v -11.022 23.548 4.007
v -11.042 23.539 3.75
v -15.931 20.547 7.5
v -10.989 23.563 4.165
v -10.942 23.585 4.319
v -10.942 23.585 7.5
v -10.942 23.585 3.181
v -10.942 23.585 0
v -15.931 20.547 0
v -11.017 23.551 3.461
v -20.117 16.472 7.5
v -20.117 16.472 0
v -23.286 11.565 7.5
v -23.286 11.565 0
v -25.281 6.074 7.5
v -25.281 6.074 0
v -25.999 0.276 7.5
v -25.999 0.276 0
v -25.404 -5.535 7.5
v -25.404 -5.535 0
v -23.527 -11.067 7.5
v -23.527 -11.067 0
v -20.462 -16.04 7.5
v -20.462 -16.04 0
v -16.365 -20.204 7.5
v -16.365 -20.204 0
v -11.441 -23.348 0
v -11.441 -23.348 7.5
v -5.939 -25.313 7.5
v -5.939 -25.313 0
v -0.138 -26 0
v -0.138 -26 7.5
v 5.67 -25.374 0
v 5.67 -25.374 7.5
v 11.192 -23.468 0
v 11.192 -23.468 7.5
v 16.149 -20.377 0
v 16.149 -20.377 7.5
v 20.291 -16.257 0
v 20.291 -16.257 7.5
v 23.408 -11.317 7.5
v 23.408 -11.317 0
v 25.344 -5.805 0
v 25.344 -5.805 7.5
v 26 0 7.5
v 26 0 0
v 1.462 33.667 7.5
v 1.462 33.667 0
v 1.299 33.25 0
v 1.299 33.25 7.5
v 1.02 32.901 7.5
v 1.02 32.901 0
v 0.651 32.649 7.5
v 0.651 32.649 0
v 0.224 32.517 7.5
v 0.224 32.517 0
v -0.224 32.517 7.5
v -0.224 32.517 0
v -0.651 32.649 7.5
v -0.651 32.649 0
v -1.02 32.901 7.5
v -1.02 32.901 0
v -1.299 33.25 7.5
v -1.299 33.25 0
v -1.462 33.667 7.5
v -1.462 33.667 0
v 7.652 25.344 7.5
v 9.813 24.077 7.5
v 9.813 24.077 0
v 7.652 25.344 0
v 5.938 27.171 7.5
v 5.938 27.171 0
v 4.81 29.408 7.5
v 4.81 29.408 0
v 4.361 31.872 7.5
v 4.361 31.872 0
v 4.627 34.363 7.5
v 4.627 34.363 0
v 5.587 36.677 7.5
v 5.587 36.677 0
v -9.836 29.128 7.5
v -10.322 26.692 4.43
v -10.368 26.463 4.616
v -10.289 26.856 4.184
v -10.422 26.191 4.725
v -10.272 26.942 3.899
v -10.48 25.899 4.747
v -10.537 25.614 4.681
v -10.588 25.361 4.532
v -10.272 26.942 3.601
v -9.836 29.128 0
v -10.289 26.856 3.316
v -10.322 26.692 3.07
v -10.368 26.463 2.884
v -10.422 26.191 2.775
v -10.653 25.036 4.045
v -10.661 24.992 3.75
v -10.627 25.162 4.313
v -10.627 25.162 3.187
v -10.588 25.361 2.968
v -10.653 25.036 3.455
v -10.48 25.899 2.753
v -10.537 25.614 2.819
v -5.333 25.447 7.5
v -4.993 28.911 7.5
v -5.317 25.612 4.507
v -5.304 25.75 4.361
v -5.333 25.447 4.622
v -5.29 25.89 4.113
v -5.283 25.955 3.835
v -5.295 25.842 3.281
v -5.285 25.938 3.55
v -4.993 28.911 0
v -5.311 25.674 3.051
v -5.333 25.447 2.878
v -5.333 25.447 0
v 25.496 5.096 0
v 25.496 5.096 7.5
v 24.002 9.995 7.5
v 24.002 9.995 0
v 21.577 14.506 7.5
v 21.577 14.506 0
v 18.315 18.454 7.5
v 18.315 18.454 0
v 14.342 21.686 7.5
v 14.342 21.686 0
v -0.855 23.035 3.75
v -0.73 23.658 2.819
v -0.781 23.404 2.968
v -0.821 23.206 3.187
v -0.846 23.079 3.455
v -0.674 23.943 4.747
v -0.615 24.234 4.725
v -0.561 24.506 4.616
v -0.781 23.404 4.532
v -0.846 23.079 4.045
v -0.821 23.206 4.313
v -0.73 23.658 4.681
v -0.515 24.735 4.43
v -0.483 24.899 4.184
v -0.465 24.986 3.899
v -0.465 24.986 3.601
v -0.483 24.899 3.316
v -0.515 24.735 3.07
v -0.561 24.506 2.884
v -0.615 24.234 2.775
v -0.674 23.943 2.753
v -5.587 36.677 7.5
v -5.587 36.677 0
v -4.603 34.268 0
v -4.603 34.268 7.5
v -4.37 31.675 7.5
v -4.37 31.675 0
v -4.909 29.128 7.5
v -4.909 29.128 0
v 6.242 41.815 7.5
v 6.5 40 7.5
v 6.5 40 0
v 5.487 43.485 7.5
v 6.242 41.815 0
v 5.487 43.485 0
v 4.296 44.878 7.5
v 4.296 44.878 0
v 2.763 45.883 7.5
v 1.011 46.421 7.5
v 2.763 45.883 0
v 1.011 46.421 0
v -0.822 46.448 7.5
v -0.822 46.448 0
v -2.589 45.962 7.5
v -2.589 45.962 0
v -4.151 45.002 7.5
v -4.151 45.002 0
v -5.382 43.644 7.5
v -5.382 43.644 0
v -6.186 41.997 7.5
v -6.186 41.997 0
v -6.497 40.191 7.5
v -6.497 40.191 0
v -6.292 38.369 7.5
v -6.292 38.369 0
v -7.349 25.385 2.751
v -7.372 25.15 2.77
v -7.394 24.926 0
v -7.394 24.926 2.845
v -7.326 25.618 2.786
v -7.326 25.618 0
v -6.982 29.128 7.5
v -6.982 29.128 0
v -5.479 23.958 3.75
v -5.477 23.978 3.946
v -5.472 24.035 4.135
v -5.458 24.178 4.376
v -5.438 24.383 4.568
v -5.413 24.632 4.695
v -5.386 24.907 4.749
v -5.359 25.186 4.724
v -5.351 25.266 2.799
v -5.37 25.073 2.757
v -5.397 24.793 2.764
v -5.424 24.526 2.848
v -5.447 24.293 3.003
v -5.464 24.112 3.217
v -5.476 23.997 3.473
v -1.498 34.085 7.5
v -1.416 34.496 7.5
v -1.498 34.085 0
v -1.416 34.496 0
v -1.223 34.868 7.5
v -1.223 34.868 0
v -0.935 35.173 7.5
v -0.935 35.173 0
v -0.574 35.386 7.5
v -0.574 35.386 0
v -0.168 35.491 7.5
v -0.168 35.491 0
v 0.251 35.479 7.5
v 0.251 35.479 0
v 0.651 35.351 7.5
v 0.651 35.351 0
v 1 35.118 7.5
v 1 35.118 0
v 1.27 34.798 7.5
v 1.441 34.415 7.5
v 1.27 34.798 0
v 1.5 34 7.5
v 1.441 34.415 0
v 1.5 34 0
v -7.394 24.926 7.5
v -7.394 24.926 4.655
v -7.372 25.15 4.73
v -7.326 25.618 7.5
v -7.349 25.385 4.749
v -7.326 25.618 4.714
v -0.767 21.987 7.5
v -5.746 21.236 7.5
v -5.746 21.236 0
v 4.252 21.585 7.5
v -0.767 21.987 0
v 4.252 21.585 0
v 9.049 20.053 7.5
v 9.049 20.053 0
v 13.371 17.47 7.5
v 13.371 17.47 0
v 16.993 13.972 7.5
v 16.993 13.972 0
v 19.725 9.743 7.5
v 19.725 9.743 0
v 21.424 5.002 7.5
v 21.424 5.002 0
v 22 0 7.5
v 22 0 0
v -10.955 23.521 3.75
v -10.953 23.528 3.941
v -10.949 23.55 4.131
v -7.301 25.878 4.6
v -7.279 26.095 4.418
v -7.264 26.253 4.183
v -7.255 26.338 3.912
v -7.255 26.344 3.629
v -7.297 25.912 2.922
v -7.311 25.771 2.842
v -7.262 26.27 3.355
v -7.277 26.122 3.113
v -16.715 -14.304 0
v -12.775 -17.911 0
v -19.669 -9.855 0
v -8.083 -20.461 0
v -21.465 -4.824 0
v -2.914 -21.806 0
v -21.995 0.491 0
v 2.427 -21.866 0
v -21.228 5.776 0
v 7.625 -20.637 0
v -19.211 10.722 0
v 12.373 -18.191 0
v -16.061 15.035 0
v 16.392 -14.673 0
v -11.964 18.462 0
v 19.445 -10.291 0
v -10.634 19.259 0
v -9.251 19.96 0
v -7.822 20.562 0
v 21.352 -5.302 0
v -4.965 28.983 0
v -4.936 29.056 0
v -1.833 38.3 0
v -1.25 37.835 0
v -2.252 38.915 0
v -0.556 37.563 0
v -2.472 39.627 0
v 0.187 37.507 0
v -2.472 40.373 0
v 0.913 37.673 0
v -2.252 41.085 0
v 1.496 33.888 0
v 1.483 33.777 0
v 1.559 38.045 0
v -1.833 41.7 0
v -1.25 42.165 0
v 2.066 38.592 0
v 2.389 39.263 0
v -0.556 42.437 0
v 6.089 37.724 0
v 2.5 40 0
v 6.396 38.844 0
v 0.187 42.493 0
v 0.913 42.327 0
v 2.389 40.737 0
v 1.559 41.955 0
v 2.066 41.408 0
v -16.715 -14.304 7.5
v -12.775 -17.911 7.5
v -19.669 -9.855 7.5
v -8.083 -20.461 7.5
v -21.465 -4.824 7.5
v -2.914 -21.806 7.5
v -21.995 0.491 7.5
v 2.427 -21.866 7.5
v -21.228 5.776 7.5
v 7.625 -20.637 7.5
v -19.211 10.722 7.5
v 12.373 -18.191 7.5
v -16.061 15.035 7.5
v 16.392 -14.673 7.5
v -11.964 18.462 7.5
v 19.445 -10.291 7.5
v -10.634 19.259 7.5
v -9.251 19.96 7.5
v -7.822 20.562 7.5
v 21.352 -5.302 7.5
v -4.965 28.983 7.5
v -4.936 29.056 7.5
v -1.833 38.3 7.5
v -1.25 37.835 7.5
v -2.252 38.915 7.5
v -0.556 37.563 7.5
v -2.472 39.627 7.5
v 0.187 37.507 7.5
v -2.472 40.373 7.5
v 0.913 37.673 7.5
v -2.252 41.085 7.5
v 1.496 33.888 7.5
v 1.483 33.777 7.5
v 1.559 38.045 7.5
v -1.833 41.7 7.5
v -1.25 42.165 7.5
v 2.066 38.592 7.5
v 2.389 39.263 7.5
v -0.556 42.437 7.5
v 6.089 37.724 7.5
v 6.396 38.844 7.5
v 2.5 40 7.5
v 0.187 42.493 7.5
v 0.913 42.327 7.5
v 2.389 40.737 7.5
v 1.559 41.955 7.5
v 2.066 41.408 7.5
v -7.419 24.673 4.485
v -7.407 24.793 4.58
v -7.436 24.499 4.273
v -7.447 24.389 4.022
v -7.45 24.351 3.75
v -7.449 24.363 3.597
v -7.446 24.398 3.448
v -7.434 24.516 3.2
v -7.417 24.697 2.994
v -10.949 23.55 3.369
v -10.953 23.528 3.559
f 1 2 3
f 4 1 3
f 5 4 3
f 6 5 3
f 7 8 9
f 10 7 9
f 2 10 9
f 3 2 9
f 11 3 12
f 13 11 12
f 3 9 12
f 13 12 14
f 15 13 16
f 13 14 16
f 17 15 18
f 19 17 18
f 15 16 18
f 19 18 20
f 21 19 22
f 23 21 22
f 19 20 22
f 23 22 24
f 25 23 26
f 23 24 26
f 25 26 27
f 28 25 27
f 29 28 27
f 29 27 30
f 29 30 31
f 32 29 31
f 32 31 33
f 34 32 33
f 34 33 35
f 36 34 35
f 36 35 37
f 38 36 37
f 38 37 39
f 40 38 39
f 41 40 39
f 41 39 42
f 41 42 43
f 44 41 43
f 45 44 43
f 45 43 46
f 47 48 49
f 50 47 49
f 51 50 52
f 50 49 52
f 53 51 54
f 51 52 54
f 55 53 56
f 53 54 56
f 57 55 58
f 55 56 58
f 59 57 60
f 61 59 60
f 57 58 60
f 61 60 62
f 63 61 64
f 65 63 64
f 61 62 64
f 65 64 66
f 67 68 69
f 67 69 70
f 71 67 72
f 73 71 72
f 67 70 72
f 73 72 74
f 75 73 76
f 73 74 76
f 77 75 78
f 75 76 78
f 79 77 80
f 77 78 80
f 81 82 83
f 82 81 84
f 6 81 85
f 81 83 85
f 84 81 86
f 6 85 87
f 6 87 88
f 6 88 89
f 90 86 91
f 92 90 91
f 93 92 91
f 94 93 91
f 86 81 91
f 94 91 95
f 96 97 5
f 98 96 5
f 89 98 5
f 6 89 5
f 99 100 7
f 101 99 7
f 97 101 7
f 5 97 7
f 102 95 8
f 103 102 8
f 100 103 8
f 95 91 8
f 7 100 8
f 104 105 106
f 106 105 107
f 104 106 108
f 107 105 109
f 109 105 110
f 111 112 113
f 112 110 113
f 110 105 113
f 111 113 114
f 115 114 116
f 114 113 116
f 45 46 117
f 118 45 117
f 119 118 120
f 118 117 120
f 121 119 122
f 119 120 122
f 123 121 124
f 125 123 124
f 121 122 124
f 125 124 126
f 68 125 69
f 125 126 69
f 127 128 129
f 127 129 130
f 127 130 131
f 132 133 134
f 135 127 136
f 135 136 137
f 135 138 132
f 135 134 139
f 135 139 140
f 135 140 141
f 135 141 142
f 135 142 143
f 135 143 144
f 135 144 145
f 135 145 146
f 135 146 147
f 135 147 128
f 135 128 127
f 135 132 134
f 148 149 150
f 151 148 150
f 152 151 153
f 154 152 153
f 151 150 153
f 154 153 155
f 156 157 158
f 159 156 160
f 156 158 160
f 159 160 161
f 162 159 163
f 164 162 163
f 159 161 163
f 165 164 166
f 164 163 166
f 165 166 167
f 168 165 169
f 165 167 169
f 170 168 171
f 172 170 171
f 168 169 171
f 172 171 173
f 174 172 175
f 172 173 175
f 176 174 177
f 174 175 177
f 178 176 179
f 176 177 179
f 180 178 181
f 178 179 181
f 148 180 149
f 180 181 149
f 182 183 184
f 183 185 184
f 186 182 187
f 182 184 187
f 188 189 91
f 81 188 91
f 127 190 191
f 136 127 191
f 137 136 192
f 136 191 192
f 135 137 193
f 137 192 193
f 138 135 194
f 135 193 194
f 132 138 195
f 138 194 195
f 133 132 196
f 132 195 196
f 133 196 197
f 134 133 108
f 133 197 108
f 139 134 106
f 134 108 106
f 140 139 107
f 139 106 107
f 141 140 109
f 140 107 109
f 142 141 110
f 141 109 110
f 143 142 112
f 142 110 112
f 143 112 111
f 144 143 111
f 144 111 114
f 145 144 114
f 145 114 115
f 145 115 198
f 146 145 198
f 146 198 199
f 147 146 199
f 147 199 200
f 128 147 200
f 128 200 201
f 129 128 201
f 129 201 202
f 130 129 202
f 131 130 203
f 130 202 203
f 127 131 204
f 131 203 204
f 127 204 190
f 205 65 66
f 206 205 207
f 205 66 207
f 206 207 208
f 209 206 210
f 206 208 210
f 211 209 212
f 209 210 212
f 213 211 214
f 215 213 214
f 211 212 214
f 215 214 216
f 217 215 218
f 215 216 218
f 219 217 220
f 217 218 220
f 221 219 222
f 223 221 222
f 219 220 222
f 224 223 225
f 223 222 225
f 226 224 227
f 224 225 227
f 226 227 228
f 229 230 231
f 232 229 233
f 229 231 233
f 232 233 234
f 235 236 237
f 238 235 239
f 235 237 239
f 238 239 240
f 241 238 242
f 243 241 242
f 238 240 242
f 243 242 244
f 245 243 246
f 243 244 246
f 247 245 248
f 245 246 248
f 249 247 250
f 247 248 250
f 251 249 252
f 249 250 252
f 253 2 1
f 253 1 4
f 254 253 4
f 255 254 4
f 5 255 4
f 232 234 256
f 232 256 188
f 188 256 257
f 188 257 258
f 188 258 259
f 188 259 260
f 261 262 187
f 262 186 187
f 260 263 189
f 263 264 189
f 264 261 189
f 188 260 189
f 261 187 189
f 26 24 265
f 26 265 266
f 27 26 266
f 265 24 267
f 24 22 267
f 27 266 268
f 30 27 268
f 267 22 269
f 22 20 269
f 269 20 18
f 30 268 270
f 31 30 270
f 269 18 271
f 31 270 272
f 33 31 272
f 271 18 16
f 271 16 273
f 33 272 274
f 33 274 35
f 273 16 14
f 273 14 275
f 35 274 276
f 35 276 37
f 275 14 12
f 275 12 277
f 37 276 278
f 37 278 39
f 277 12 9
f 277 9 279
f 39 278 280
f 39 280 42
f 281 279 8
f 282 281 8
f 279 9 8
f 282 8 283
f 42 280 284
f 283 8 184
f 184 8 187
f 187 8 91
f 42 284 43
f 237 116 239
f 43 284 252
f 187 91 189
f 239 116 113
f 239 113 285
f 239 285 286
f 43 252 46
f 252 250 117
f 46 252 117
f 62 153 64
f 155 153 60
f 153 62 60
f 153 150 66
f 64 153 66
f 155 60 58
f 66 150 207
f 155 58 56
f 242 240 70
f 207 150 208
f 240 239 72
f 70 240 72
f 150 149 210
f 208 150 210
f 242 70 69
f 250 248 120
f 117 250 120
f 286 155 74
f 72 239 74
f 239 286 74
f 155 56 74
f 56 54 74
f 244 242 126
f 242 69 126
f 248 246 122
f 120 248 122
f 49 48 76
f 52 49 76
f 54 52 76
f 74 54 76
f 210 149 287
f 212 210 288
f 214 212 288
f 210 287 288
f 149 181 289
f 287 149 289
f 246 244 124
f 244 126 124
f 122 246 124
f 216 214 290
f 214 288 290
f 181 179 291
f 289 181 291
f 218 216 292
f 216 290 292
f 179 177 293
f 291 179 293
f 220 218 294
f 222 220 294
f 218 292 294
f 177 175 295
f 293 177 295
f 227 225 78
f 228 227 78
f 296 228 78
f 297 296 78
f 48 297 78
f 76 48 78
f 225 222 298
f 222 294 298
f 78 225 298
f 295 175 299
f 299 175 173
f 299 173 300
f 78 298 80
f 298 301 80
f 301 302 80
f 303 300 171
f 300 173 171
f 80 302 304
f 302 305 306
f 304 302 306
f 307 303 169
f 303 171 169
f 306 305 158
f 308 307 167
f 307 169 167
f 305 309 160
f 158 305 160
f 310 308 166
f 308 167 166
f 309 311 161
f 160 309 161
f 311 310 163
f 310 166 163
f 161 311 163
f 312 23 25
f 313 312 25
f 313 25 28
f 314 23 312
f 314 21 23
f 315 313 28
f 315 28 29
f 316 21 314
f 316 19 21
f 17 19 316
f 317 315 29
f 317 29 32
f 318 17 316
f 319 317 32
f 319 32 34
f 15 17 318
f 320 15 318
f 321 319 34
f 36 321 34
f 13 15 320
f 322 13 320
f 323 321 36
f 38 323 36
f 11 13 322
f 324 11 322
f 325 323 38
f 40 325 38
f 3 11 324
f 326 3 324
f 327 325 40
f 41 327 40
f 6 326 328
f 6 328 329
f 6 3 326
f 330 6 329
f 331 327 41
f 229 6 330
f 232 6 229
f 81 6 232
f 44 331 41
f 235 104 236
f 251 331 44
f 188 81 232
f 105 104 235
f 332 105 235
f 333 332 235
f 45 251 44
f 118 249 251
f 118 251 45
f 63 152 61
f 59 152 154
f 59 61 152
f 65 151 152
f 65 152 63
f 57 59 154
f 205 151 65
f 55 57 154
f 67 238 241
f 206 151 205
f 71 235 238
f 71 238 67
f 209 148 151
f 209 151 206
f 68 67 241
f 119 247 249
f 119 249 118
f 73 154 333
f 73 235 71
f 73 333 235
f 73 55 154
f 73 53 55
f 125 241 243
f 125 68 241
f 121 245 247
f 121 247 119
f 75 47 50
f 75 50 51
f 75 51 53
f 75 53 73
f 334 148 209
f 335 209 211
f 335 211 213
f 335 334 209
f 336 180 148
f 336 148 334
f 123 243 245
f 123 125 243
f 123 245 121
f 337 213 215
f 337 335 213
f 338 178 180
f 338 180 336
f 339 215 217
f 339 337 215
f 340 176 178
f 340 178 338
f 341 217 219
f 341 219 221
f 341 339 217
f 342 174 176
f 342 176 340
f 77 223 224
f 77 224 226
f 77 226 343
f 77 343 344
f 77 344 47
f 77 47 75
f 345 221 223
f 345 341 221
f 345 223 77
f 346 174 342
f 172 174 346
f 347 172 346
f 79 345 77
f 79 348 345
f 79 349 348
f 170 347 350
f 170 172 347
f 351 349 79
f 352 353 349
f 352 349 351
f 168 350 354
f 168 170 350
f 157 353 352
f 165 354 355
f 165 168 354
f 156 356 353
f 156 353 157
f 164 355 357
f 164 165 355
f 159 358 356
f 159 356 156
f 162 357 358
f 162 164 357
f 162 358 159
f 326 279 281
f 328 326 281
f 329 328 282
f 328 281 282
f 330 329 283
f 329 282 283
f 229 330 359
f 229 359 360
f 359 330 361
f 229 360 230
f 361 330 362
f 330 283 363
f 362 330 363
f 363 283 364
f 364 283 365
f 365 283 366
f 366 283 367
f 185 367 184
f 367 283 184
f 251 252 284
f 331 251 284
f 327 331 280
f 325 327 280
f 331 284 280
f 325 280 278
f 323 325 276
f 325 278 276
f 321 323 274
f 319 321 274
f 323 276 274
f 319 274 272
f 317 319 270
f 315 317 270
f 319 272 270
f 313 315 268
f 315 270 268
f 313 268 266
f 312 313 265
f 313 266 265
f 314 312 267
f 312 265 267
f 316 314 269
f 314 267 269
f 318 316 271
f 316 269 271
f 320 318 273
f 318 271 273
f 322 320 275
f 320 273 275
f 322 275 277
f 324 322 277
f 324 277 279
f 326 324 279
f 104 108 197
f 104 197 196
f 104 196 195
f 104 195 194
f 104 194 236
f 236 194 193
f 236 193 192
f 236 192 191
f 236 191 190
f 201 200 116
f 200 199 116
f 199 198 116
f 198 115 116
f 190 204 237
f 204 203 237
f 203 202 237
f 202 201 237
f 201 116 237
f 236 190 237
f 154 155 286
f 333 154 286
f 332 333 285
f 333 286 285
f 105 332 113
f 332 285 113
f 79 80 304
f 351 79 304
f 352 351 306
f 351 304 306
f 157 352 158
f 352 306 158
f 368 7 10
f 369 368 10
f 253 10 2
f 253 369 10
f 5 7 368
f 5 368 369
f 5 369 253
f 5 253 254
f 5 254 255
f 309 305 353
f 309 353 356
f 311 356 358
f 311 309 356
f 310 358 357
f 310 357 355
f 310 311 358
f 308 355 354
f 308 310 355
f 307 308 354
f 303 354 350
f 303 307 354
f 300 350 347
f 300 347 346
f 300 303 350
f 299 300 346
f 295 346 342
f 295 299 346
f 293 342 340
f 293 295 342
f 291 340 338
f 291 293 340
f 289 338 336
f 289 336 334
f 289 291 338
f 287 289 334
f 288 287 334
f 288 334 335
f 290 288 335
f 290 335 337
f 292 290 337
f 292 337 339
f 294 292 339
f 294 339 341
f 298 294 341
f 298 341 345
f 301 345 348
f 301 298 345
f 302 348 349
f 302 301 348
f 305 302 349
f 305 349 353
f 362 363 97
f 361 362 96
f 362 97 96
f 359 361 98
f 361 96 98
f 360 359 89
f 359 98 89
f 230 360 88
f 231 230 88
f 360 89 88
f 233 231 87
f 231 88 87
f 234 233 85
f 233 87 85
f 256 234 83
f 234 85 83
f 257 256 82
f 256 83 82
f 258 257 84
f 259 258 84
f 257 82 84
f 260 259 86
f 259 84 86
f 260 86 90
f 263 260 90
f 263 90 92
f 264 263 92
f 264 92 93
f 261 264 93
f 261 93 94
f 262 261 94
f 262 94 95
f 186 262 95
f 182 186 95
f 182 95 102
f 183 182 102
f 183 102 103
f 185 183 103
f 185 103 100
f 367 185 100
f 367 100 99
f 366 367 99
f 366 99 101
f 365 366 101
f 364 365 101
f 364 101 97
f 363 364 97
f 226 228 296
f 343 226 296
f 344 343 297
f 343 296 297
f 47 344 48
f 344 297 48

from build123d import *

# Parameters (mm, degrees)
F0_R     = 2.5
F1_DEPTH = 7.5
F2_R     = 1
F3_DEPTH = 10
F4_DEPTH = 25


with BuildPart() as f1:
    # F0 (on Top) → F1 (new body)
    with BuildSketch(Plane.XY):
        with BuildLine():
            ThreePointArc((1.4624940646, 33.6666666667), (3.832617517, 34.7501387667), (5.5866740582, 36.6774899598))
            ThreePointArc((5.5866740582, 36.6774899598), (6.2675107251, 38.2771217946), (6.5, 40))
            ThreePointArc((6.5, 40), (-1.7228782054, 46.2675107251), (-5.5866740582, 36.6774899598))
            ThreePointArc((-5.5866740582, 36.6774899598), (-3.832617517, 34.7501387667), (-1.4624940646, 33.6666666667))
            ThreePointArc((-1.4624940646, 33.6666666667), (-0.1677183698, 35.4905940254), (1.5, 34))
            ThreePointArc((1.5, 34), (1.4905940254, 33.8322816302), (1.4624940646, 33.6666666667))
        make_face()
        with Locations((0, 40)):
            Circle(F0_R, mode=Mode.SUBTRACT)
        with BuildLine():
            ThreePointArc((-5.3332565238, 25.44712901), (2.3423382025, 25.8942744974), (9.8131006729, 24.0770233871))
            ThreePointArc((9.8131006729, 24.0770233871), (4.8098794275, 29.40789523), (5.5866740582, 36.6774899598))
            ThreePointArc((5.5866740582, 36.6774899598), (3.832617517, 34.7501387667), (1.4624940646, 33.6666666667))
            ThreePointArc((1.4624940646, 33.6666666667), (0, 32.5), (-1.4624940646, 33.6666666667))
            ThreePointArc((-1.4624940646, 33.6666666667), (-3.832617517, 34.7501387667), (-5.5866740582, 36.6774899598))
            ThreePointArc((-5.5866740582, 36.6774899598), (-4.3898764062, 32.979997265), (-4.9088964418, 29.128452763))
            ThreePointArc((-4.9088964418, 29.128452763), (-4.9503969095, 29.0195498849), (-4.993341291, 28.9112082687))
            Line((-4.993341291, 28.9112082687), (-5.3332565238, 25.44712901))
        make_face()
        with BuildLine():
            ThreePointArc((-10.9419213055, 23.5854692161), (-13.9912480869, -21.9144923959), (26, 0))
            ThreePointArc((26, 0), (21.5770783182, 14.5061949267), (9.8131006729, 24.0770233871))
            ThreePointArc((9.8131006729, 24.0770233871), (2.3423382025, 25.8942744974), (-5.3332565238, 25.44712901))
            Line((-5.3332565238, 25.44712901), (-5.7464520703, 21.2362494006))
            ThreePointArc((-5.7464520703, 21.2362494006), (13.371201413, 17.4702882854), (22, 0))
            ThreePointArc((22, 0), (-10.5068405661, -19.3288980886), (-11.9642092108, 18.4623318668))
            Line((-11.9642092108, 18.4623318668), (-10.9419213055, 23.5854692161))
        make_face()
        with BuildLine():
            ThreePointArc((-9.8131006729, 24.0770233871), (-10.3804210274, 23.837929006), (-10.9419213055, 23.5854692161))
            Line((-10.9419213055, 23.5854692161), (-11.9642092108, 18.4623318668))
            ThreePointArc((-11.9642092108, 18.4623318668), (-9.9487622141, 19.6219807972), (-7.8221766033, 20.5624306245))
            Line((-7.8221766033, 20.5624306245), (-7.3939510007, 24.9264816731))
            ThreePointArc((-7.3939510007, 24.9264816731), (-8.6140032313, 24.5315908235), (-9.8131006729, 24.0770233871))
        make_face()
        with BuildLine():
            ThreePointArc((-7.326121242, 25.6177353666), (-8.504893301, 24.7429137255), (-9.8131006729, 24.0770233871))
            ThreePointArc((-9.8131006729, 24.0770233871), (-8.6140032313, 24.5315908235), (-7.3939510007, 24.9264816731))
            Line((-7.3939510007, 24.9264816731), (-7.326121242, 25.6177353666))
        make_face()
        with BuildLine():
            Line((-9.8358558903, 29.128452763), (-10.9419213055, 23.5854692161))
            ThreePointArc((-10.9419213055, 23.5854692161), (-10.3804210274, 23.837929006), (-9.8131006729, 24.0770233871))
            ThreePointArc((-9.8131006729, 24.0770233871), (-8.504893301, 24.7429137255), (-7.326121242, 25.6177353666))
            Line((-7.326121242, 25.6177353666), (-6.9816296089, 29.128452763))
            Line((-6.9816296089, 29.128452763), (-9.8358558903, 29.128452763))
        make_face()
    extrude(amount=F1_DEPTH)

    # F2 (on face) → F3 (cut)
    with BuildSketch(Plane(origin=(-15.0490291094, 3.0029334363, 0), x_dir=(-0.1956855032, -0.9806667037, 0), z_dir=(-0.9806667037, 0.1956855032, 0))):
        with Locations((-23.4226267785, 3.75)):
            Circle(F2_R)
    extrude(amount=-F3_DEPTH, mode=Mode.SUBTRACT)

    # F2 (on face) → F4 (cut)
    with BuildSketch(Plane(origin=(-15.0490291094, 3.0029334363, 0), x_dir=(-0.1956855032, -0.9806667037, 0), z_dir=(-0.9806667037, 0.1956855032, 0))):
        with BuildLine():
            Line((-20.9883089752, 3.1807049686), (-20.9883089752, 4.3192950314))
            ThreePointArc((-20.9883089752, 4.3192950314), (-25.9226267785, 3.75), (-20.9883089752, 3.1807049686))
        make_face()
        with Locations((-23.4226267785, 3.75)):
            Circle(F2_R, mode=Mode.SUBTRACT)
        with BuildLine():
            ThreePointArc((-20.9883089752, 3.1807049686), (-20.9391016117, 3.4634642327), (-20.9226267785, 3.75))
            ThreePointArc((-20.9226267785, 3.75), (-20.9391016117, 4.0365357673), (-20.9883089752, 4.3192950314))
            Line((-20.9883089752, 4.3192950314), (-20.9883089752, 3.1807049686))
        make_face()
    extrude(amount=F4_DEPTH, mode=Mode.SUBTRACT)


solid = f1.part
